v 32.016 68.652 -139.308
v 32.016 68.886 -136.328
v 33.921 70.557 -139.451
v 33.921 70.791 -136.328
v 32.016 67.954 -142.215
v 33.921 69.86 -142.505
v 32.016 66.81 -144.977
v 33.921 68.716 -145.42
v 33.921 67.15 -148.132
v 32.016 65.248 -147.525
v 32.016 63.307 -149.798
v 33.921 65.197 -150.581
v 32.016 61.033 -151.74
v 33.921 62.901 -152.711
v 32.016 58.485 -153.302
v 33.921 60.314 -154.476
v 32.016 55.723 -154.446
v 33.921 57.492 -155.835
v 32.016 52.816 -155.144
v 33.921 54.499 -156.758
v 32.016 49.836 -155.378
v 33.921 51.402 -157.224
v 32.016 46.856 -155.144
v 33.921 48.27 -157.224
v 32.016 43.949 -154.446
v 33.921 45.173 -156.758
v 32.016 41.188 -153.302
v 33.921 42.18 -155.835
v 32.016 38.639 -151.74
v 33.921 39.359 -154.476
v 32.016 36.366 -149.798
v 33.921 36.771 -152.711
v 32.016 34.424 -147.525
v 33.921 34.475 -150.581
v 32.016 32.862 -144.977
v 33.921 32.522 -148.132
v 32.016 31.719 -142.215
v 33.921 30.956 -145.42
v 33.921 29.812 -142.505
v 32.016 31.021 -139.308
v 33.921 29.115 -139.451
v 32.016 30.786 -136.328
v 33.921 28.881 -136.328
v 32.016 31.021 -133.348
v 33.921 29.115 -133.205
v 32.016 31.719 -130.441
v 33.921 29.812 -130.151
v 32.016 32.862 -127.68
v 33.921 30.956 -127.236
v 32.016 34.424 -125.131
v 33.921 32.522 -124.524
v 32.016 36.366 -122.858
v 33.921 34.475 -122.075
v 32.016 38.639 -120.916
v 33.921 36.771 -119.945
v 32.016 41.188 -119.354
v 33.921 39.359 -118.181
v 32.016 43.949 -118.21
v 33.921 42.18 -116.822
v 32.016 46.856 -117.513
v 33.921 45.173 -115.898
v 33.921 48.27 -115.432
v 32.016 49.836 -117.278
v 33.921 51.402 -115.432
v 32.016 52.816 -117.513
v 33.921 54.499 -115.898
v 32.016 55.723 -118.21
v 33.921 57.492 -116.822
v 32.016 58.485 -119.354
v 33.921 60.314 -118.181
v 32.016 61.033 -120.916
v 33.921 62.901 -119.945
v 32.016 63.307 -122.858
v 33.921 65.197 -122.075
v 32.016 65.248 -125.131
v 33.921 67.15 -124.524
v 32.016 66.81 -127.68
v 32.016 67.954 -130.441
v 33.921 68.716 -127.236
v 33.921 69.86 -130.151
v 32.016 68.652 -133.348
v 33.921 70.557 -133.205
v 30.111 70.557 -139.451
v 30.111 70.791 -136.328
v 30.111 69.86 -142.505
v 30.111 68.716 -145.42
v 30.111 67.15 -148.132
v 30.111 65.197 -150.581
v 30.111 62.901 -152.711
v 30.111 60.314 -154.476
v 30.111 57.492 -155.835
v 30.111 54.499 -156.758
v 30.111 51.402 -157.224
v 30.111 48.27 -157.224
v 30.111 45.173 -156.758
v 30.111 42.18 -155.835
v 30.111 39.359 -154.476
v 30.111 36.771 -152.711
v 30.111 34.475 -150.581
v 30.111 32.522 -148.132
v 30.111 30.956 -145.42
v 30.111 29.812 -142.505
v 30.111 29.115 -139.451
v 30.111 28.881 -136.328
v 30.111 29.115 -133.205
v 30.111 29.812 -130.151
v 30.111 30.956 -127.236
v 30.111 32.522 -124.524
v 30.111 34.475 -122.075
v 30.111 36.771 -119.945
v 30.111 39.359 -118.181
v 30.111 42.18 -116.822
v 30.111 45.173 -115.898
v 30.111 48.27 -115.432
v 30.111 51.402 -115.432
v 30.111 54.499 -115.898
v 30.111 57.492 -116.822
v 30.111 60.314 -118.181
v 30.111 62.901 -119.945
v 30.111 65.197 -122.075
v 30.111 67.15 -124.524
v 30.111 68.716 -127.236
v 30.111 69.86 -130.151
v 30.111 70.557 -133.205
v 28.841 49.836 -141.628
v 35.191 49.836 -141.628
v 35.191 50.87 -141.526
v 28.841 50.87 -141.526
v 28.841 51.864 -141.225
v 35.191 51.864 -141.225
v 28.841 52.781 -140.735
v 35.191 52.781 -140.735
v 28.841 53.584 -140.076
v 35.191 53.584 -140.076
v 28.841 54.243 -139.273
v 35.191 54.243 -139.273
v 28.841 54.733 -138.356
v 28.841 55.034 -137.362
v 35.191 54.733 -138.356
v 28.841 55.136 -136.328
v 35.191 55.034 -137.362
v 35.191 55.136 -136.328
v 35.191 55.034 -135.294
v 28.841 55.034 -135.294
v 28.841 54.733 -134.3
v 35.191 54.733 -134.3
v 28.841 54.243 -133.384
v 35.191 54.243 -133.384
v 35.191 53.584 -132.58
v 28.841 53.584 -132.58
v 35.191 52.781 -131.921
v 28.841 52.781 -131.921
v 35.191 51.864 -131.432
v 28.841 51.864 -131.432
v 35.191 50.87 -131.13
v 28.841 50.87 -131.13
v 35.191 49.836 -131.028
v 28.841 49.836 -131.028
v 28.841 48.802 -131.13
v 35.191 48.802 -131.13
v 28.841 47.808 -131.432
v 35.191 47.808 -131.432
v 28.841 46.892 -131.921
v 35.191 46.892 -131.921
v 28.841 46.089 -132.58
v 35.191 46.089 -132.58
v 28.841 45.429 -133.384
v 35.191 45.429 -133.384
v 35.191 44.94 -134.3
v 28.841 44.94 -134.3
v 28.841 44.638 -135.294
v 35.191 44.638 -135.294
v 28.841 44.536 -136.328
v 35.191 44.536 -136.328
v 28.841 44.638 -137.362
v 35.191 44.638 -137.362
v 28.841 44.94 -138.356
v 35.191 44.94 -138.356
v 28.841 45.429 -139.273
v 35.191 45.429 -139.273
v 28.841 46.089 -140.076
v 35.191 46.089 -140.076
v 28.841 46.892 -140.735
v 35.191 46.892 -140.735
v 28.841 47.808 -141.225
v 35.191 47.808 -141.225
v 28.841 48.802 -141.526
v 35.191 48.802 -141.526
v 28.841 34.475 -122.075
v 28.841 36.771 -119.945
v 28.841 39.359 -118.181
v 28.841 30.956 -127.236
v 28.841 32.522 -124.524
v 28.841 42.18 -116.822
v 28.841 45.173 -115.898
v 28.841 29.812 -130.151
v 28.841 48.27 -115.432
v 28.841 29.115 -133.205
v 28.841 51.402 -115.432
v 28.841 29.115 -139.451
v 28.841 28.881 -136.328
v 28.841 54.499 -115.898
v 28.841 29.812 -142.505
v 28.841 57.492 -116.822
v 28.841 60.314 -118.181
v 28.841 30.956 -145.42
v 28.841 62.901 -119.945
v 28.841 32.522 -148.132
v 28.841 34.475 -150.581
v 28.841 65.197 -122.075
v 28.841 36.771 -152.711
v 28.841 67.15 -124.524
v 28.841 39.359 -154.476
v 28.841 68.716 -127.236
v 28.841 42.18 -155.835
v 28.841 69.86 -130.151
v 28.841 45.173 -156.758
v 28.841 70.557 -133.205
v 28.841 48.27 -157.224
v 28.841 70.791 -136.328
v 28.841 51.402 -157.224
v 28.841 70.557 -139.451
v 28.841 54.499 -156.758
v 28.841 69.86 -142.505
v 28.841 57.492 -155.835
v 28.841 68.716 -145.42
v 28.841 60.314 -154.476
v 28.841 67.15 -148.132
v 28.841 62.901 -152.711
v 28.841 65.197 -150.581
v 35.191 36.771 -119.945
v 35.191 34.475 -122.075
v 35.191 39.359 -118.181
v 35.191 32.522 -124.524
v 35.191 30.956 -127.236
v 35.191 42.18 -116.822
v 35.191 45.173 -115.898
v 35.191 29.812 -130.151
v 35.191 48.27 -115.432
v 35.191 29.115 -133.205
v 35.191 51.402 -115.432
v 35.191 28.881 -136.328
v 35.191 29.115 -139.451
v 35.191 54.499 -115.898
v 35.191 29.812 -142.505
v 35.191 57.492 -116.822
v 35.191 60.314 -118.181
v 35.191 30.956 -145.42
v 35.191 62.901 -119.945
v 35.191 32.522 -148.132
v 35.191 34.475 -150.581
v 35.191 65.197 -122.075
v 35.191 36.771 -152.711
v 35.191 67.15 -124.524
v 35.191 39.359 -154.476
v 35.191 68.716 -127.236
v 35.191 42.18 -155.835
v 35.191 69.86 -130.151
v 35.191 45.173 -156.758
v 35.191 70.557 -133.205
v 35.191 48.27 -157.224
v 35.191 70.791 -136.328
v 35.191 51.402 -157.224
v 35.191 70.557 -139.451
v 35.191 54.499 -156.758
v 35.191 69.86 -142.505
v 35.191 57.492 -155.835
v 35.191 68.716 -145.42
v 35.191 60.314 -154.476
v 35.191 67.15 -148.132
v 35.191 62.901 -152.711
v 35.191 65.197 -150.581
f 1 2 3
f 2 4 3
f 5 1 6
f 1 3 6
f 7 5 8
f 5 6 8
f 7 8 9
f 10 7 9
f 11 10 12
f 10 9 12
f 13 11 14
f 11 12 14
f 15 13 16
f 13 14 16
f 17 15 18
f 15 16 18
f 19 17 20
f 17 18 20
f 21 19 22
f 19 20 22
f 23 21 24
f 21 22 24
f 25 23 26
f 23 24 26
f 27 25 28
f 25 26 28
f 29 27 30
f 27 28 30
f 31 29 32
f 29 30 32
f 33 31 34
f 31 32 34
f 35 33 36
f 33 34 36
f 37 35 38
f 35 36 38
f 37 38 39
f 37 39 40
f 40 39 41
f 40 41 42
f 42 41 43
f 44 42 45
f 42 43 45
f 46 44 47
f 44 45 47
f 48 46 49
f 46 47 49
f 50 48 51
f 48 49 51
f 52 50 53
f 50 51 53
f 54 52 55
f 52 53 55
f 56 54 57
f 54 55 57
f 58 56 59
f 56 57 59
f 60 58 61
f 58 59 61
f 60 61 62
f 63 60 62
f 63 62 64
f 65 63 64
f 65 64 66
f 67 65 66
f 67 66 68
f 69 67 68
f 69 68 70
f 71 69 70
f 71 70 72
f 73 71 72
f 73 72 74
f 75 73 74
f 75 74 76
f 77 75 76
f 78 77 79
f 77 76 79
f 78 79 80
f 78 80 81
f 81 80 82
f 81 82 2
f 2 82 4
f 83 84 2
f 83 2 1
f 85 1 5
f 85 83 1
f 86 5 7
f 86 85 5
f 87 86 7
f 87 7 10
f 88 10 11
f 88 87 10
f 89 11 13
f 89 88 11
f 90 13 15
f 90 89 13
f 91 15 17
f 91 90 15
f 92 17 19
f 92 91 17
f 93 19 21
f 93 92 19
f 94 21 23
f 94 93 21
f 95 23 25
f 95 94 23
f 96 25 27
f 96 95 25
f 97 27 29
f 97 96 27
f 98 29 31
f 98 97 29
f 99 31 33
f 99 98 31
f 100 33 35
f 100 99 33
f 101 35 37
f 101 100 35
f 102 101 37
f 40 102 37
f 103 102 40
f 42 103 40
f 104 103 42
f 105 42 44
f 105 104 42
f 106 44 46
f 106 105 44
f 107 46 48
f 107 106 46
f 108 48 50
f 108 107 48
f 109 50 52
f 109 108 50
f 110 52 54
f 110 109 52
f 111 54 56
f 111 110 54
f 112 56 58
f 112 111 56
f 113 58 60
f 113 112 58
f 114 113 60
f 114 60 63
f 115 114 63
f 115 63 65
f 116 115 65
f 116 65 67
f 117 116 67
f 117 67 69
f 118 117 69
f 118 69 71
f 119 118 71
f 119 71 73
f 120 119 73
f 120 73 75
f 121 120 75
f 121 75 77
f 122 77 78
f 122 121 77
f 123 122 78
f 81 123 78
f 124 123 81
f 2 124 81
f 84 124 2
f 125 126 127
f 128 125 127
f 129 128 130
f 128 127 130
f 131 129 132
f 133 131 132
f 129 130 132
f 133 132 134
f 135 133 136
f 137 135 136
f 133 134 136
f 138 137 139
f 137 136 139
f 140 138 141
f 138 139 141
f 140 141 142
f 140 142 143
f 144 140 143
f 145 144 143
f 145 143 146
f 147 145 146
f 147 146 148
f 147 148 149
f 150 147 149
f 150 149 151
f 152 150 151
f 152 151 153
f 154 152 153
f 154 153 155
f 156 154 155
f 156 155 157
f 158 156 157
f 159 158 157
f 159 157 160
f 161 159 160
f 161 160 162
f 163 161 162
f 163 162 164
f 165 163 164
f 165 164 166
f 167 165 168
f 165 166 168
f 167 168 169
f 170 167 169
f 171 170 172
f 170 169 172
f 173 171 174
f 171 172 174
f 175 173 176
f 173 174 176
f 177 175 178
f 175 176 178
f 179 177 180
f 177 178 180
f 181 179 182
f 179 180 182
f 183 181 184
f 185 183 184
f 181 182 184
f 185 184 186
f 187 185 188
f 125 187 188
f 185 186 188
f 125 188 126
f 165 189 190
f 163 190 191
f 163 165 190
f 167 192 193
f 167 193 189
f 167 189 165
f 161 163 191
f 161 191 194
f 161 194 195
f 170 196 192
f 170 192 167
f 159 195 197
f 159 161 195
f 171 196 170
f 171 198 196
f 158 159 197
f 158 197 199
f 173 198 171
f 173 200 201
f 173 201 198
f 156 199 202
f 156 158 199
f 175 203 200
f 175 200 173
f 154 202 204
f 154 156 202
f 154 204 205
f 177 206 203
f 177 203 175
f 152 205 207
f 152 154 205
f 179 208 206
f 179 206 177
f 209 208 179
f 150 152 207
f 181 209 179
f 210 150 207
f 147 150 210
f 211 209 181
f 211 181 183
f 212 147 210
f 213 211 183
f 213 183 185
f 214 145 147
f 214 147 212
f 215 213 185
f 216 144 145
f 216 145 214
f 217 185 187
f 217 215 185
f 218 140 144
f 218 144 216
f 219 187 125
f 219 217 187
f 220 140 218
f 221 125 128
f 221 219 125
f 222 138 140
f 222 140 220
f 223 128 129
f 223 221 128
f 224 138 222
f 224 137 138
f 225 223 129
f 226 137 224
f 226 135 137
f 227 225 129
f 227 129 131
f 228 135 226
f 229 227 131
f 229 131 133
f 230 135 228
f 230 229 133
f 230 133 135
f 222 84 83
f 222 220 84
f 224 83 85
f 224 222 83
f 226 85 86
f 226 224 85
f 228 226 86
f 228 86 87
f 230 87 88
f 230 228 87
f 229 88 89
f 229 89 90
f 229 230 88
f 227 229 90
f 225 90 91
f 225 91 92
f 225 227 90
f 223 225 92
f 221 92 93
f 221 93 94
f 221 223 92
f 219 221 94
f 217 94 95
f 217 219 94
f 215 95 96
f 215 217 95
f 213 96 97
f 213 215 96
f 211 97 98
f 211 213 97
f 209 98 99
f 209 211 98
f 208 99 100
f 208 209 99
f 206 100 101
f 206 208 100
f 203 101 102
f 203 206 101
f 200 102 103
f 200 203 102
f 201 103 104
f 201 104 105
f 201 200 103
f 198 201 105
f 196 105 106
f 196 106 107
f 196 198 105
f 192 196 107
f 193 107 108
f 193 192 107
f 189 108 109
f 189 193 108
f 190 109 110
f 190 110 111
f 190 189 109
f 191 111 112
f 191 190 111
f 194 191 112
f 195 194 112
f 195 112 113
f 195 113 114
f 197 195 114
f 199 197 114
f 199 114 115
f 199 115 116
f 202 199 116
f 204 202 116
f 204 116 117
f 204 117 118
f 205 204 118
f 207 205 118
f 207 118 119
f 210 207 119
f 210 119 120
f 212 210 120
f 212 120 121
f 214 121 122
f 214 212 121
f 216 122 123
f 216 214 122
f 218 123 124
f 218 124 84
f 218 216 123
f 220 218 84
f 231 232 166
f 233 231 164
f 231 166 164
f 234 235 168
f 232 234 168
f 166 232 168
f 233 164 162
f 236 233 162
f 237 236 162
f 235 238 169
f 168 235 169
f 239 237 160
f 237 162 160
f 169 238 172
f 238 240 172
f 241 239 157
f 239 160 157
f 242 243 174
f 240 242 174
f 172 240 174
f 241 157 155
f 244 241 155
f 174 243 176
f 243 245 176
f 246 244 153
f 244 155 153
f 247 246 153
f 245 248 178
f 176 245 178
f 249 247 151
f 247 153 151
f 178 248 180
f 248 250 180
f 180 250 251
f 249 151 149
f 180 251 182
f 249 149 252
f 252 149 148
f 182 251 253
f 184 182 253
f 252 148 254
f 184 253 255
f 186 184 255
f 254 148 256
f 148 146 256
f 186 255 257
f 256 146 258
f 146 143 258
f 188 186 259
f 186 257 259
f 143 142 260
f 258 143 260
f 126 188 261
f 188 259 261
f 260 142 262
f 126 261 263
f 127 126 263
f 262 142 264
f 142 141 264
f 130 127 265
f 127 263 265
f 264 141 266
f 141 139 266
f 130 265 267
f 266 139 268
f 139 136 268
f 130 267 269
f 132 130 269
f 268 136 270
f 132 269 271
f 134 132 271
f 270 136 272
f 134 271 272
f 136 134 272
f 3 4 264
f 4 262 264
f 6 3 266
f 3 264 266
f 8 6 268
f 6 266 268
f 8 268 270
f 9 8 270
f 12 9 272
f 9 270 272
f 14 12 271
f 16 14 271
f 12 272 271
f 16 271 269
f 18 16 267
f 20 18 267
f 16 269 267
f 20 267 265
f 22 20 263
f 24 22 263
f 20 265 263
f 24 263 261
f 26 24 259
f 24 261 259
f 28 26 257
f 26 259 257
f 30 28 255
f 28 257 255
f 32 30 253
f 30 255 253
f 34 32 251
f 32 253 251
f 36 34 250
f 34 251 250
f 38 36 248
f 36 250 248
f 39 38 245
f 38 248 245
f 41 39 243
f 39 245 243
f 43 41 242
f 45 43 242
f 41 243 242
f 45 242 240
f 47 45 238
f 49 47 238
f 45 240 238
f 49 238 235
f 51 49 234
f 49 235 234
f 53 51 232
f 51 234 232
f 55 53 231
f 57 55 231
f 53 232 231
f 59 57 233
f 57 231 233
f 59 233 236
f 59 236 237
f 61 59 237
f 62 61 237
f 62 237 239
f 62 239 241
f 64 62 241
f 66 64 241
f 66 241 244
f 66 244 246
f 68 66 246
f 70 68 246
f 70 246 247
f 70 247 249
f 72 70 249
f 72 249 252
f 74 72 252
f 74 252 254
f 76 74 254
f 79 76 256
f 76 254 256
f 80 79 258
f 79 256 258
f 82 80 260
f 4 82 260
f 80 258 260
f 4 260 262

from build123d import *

# Parameters (mm, degrees)
SKETCH1_R           = 19.05
BOSS_EXTRUDE1_DEPTH = 1.905
SKETCH6_R           = 5.3
CUT_EXTRUDE2_DEPTH  = 7.35


with BuildPart() as part:
    # Sketch1 → Boss-Extrude1 (new body, symmetric)
    with BuildSketch(Plane(origin=(32.015745885, 0, 0), x_dir=(0, 0, -1), z_dir=(1, 0, 0))):
        with Locations((136.328078847, 49.836172535)):
            Circle(SKETCH1_R)
    extrude(amount=BOSS_EXTRUDE1_DEPTH, both=True)

    # Sketch5 → Revolve1 (revolve)
    with BuildSketch(Plane(origin=(0, 0, -136.328078847), x_dir=(-1, 0, 0), z_dir=(0, 0, -1))):
        Polygon((-32.015745885, 68.886172535), (-33.920745885, 70.791172535), (-35.190745885, 70.791172535), (-35.190745885, 49.836172535), (-33.920745885, 49.836172535), (-33.920745885, 68.886172535), align=None)
    revolve1 = revolve(axis=Axis((33.920745885, 49.836172535, -136.328078847), (-1, 0, 0)))

    # Mirror2: Revolve1 across plane
    add(revolve1.mirror(Plane(origin=(32.015745885, 0, 0), x_dir=(0, 0, 1), z_dir=(1, 0, 0))))

    # Sketch6 → Cut-Extrude2 (cut, through all)
    with BuildSketch(Plane(origin=(35.190745885, 0, 0), x_dir=(0, 0, -1), z_dir=(1, 0, 0))):
        with Locations((136.328078847, 49.836172535)):
            Circle(SKETCH6_R)
    extrude(amount=-CUT_EXTRUDE2_DEPTH, mode=Mode.SUBTRACT)


solid = part.part
